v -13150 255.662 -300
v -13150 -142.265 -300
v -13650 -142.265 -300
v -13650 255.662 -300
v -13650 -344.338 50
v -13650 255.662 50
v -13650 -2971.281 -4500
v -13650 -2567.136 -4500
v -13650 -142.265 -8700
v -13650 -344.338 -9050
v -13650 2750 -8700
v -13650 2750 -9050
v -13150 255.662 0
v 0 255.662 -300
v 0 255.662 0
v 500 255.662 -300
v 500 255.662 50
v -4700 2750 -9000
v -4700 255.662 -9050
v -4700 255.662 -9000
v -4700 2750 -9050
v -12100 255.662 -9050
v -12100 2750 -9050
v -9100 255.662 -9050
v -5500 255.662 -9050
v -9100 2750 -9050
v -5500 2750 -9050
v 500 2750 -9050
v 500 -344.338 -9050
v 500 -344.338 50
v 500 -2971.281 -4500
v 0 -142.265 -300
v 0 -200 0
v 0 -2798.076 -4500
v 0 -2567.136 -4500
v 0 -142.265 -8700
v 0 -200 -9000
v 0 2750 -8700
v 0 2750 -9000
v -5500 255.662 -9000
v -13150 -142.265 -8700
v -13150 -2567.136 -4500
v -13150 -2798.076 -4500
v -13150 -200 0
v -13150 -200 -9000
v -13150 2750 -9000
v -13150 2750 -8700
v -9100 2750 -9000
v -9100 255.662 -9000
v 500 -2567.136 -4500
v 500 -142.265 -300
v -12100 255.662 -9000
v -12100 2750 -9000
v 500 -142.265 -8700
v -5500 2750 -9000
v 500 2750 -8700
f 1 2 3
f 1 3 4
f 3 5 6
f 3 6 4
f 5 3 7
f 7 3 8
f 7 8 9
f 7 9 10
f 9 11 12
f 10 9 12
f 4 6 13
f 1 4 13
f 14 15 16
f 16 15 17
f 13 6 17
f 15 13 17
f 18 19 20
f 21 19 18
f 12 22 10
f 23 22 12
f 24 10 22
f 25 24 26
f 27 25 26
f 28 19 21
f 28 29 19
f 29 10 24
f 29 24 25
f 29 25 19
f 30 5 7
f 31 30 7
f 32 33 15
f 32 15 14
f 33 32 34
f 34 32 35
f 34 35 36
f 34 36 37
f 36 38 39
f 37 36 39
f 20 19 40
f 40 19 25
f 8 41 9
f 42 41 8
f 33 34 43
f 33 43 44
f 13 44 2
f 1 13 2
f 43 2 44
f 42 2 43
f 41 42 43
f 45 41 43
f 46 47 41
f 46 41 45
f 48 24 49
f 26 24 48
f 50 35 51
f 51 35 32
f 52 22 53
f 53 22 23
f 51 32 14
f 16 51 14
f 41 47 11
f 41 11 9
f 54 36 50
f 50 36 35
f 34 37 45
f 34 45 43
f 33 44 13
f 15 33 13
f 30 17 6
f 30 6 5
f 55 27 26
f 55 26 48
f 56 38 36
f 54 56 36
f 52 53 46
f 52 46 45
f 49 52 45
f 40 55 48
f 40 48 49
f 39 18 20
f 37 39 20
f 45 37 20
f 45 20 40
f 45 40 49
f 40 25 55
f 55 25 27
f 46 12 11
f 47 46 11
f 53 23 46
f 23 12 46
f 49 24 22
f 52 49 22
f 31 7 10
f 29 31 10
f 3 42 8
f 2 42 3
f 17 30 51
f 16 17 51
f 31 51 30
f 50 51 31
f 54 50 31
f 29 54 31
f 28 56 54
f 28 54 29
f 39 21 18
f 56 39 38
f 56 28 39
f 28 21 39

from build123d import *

# Parameters (mm, degrees)
EXTRUDE_1_DEPTH     = 13150
EXTRUDE_2_DEPTH     = 500
EXTRUDE_START       = -13150
EXTRUDE_3_DEPTH     = 500
SKETCH_4_W          = 800
SKETCH_4_H          = 2752.478260032
SKETCH_4_W_2        = 3000
SKETCH_4_H_2        = 2728.418031008
CUT_EXTRUDE_2_DEPTH = 460
SKETCH_7_W          = 15709.854083563
SKETCH_7_H          = 3277.507192375
CUT_EXTRUDE_4_DEPTH = 670


with BuildPart() as part:
    # Эскиз2 → Бобышка-Вытянуть1 (new body)
    with BuildSketch(Plane(origin=(0, 0, 0), x_dir=(0, 0, -1), z_dir=(1, 0, 0))):
        Polygon((4500, -2971.28129211), (9050, -344.337567297), (9050, 2750), (9000, 2750), (9000, -200), (4500, -2798.076211353), (0, -200), (0, 2750), (-50, 2750), (-50, -344.337567297), align=None)
    extrude(amount=-EXTRUDE_1_DEPTH)

    # Эскиз5 → Бобышка-Вытянуть2 (add)
    with BuildSketch(Plane(origin=(0, 0, 0), x_dir=(0, 0, -1), z_dir=(1, 0, 0))):
        Polygon((-50, 2750), (-50, -344.337567297), (4500, -2971.28129211), (9050, -344.337567297), (9050, 2750), (8700, 2750), (8700, -142.264973081), (4500, -2567.136103677), (300, -142.264973081), (300, 2750), align=None)
    extrude(amount=EXTRUDE_2_DEPTH)

    # Эскиз5<2> → Бобышка-Вытянуть3 (add)
    with BuildSketch(Plane(origin=(0, 0, 0), x_dir=(0, 0, -1), z_dir=(1, 0, 0)).offset(EXTRUDE_START)):
        Polygon((-50, 2750), (-50, -344.337567297), (4500, -2971.28129211), (9050, -344.337567297), (9050, 2750), (8700, 2750), (8700, -142.264973081), (4500, -2567.136103677), (300, -142.264973081), (300, 2750), align=None)
    extrude(amount=-EXTRUDE_3_DEPTH)

    # Эскиз4 → Вырез-Вытянуть2 (cut)
    with BuildSketch(Plane(origin=(0, 0, -9050), x_dir=(-1, 0, 0), z_dir=(0, 0, -1))):
        with Locations((5100, 1631.901562719)):
            Rectangle(SKETCH_4_W, SKETCH_4_H)
        with Locations((10600, 1619.871448207)):
            Rectangle(SKETCH_4_W_2, SKETCH_4_H_2)
    extrude(amount=-CUT_EXTRUDE_2_DEPTH, mode=Mode.SUBTRACT)

    # Эскиз7 → Вырез-Вытянуть4 (cut)
    with BuildSketch(Plane.XY.offset(50)):
        with Locations((-6585.237035545, 1894.416028891)):
            Rectangle(SKETCH_7_W, SKETCH_7_H)
    extrude(amount=-CUT_EXTRUDE_4_DEPTH, mode=Mode.SUBTRACT)


solid = part.part
